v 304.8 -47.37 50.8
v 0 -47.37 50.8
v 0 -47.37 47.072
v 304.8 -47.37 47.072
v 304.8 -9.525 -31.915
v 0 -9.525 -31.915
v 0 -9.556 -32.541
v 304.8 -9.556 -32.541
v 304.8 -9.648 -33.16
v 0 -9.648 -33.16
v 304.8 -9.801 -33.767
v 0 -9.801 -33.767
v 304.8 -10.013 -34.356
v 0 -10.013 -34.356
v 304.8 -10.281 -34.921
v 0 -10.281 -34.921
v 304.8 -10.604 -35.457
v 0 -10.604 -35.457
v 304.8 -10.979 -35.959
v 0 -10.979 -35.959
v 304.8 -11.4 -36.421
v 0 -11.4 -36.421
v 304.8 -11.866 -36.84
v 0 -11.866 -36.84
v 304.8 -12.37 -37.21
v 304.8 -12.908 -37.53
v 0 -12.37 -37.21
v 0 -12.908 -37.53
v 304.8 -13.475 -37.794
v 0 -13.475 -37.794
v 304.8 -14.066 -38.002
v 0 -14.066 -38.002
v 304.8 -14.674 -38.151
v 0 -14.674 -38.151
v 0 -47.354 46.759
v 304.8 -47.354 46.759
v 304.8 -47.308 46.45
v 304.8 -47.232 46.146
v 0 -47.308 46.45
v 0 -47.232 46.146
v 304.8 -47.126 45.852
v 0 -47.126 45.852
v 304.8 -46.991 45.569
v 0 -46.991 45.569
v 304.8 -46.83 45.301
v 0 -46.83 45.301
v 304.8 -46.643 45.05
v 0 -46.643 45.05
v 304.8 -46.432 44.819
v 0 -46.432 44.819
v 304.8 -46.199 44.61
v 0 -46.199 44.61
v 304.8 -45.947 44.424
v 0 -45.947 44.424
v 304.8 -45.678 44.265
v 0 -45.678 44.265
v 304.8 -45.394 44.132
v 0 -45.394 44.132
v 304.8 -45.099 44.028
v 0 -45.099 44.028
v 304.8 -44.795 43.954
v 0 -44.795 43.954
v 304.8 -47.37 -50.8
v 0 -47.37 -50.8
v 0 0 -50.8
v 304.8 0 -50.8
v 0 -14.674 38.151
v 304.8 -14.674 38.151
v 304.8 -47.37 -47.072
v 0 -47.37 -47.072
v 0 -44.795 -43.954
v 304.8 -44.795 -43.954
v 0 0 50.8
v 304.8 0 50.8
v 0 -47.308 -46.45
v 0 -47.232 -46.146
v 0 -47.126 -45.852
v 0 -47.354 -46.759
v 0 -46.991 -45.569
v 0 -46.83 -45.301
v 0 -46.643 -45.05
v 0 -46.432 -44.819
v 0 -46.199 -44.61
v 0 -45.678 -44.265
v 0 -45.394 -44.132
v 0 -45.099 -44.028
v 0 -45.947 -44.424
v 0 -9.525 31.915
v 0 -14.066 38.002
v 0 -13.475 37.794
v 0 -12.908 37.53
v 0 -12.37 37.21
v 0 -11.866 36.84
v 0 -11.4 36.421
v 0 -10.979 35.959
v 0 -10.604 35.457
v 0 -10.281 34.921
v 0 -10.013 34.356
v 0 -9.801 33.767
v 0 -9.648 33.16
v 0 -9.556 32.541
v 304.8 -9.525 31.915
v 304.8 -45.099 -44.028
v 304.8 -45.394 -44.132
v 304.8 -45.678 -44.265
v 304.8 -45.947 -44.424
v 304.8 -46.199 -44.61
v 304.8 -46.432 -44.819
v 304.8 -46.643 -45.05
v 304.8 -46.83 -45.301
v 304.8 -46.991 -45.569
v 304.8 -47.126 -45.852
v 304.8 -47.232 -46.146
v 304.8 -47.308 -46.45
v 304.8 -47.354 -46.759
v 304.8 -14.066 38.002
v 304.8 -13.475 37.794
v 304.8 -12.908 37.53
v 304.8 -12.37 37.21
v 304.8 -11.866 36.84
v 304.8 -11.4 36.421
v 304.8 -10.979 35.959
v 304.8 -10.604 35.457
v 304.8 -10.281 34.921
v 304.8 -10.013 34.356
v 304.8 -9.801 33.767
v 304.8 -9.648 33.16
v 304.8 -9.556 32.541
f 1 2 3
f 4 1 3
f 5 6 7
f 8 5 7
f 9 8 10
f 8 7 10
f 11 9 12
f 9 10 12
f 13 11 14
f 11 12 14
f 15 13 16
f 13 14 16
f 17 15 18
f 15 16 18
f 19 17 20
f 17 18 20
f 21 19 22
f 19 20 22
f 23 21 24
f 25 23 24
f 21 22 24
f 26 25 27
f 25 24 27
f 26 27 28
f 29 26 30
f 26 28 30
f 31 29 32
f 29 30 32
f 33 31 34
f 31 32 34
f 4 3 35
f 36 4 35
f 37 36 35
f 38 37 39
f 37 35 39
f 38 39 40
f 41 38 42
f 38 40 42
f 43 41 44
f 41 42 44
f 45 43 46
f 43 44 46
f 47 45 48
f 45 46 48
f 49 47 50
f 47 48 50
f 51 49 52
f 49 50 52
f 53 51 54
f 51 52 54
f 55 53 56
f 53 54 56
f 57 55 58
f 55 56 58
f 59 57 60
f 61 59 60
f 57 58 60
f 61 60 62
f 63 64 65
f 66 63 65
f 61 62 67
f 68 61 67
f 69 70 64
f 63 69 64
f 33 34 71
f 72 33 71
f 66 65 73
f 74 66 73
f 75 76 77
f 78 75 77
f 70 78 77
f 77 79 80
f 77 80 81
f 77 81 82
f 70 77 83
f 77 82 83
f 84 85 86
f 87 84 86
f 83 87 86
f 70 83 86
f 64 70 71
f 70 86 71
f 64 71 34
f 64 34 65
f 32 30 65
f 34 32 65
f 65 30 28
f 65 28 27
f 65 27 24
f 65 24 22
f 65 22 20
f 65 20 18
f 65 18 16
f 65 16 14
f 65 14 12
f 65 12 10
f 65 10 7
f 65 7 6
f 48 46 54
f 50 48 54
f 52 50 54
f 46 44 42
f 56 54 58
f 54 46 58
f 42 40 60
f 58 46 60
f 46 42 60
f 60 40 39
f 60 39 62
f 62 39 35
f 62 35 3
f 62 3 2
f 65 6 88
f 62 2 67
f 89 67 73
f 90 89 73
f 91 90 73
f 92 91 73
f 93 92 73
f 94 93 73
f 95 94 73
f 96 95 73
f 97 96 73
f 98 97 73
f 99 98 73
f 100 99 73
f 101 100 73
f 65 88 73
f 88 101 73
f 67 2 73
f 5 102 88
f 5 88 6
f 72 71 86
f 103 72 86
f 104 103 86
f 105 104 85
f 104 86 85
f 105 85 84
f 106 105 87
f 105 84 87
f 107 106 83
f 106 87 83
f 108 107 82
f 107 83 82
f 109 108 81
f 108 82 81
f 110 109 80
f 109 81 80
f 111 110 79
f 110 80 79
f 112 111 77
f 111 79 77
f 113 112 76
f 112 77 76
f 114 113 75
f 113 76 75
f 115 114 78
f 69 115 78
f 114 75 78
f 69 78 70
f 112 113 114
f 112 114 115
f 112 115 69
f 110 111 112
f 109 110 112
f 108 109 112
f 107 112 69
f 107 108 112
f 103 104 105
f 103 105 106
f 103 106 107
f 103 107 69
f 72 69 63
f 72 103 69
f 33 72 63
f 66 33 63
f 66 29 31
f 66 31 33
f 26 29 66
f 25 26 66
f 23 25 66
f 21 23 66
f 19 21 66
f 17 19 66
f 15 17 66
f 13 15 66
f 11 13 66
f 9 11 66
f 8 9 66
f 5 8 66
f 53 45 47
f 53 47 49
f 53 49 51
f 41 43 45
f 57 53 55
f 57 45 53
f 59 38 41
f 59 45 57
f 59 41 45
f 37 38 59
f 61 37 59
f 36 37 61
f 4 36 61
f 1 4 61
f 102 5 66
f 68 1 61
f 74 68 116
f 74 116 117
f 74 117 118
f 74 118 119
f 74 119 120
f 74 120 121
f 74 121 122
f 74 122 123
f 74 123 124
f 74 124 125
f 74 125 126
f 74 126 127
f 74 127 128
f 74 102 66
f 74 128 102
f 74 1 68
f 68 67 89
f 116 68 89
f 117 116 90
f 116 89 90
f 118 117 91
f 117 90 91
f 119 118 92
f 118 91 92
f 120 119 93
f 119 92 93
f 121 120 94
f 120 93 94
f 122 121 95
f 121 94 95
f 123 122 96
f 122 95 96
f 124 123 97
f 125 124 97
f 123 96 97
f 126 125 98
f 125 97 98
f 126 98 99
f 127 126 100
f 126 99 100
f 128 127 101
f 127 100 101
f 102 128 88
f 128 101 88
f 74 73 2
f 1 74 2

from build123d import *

# Parameters (mm, degrees)
F1_DEPTH = 304.8


with BuildPart() as f1:
    # F0 (on Right) → F1 (new body)
    with BuildSketch(Plane.YZ):
        with BuildLine():
            Line((0, 0), (0, 50.8))
            Line((0, 50.8), (-47.36958, 50.8))
            Line((-47.36958, 50.8), (-47.36958, 47.071686))
            ThreePointArc((-47.36958, 47.071686), (-46.642815, 45.05011), (-44.795237, 43.954021))
            Line((-44.795237, 43.954021), (-14.673686, 38.150726))
            ThreePointArc((-14.673686, 38.150726), (-10.978529, 35.958548), (-9.525, 31.915396))
            Line((-9.525, 31.915396), (-9.525, 0))
            Line((-9.525, 0), (-9.525, -31.915396))
            ThreePointArc((-9.525, -31.915396), (-10.978529, -35.958548), (-14.673686, -38.150726))
            Line((-14.673686, -38.150726), (-44.795237, -43.954021))
            ThreePointArc((-44.795237, -43.954021), (-46.642815, -45.05011), (-47.36958, -47.071686))
            Line((-47.36958, -47.071686), (-47.36958, -50.8))
            Line((-47.36958, -50.8), (0, -50.8))
            Line((0, -50.8), (0, 0))
        make_face()
    extrude(amount=F1_DEPTH)


solid = f1.part
